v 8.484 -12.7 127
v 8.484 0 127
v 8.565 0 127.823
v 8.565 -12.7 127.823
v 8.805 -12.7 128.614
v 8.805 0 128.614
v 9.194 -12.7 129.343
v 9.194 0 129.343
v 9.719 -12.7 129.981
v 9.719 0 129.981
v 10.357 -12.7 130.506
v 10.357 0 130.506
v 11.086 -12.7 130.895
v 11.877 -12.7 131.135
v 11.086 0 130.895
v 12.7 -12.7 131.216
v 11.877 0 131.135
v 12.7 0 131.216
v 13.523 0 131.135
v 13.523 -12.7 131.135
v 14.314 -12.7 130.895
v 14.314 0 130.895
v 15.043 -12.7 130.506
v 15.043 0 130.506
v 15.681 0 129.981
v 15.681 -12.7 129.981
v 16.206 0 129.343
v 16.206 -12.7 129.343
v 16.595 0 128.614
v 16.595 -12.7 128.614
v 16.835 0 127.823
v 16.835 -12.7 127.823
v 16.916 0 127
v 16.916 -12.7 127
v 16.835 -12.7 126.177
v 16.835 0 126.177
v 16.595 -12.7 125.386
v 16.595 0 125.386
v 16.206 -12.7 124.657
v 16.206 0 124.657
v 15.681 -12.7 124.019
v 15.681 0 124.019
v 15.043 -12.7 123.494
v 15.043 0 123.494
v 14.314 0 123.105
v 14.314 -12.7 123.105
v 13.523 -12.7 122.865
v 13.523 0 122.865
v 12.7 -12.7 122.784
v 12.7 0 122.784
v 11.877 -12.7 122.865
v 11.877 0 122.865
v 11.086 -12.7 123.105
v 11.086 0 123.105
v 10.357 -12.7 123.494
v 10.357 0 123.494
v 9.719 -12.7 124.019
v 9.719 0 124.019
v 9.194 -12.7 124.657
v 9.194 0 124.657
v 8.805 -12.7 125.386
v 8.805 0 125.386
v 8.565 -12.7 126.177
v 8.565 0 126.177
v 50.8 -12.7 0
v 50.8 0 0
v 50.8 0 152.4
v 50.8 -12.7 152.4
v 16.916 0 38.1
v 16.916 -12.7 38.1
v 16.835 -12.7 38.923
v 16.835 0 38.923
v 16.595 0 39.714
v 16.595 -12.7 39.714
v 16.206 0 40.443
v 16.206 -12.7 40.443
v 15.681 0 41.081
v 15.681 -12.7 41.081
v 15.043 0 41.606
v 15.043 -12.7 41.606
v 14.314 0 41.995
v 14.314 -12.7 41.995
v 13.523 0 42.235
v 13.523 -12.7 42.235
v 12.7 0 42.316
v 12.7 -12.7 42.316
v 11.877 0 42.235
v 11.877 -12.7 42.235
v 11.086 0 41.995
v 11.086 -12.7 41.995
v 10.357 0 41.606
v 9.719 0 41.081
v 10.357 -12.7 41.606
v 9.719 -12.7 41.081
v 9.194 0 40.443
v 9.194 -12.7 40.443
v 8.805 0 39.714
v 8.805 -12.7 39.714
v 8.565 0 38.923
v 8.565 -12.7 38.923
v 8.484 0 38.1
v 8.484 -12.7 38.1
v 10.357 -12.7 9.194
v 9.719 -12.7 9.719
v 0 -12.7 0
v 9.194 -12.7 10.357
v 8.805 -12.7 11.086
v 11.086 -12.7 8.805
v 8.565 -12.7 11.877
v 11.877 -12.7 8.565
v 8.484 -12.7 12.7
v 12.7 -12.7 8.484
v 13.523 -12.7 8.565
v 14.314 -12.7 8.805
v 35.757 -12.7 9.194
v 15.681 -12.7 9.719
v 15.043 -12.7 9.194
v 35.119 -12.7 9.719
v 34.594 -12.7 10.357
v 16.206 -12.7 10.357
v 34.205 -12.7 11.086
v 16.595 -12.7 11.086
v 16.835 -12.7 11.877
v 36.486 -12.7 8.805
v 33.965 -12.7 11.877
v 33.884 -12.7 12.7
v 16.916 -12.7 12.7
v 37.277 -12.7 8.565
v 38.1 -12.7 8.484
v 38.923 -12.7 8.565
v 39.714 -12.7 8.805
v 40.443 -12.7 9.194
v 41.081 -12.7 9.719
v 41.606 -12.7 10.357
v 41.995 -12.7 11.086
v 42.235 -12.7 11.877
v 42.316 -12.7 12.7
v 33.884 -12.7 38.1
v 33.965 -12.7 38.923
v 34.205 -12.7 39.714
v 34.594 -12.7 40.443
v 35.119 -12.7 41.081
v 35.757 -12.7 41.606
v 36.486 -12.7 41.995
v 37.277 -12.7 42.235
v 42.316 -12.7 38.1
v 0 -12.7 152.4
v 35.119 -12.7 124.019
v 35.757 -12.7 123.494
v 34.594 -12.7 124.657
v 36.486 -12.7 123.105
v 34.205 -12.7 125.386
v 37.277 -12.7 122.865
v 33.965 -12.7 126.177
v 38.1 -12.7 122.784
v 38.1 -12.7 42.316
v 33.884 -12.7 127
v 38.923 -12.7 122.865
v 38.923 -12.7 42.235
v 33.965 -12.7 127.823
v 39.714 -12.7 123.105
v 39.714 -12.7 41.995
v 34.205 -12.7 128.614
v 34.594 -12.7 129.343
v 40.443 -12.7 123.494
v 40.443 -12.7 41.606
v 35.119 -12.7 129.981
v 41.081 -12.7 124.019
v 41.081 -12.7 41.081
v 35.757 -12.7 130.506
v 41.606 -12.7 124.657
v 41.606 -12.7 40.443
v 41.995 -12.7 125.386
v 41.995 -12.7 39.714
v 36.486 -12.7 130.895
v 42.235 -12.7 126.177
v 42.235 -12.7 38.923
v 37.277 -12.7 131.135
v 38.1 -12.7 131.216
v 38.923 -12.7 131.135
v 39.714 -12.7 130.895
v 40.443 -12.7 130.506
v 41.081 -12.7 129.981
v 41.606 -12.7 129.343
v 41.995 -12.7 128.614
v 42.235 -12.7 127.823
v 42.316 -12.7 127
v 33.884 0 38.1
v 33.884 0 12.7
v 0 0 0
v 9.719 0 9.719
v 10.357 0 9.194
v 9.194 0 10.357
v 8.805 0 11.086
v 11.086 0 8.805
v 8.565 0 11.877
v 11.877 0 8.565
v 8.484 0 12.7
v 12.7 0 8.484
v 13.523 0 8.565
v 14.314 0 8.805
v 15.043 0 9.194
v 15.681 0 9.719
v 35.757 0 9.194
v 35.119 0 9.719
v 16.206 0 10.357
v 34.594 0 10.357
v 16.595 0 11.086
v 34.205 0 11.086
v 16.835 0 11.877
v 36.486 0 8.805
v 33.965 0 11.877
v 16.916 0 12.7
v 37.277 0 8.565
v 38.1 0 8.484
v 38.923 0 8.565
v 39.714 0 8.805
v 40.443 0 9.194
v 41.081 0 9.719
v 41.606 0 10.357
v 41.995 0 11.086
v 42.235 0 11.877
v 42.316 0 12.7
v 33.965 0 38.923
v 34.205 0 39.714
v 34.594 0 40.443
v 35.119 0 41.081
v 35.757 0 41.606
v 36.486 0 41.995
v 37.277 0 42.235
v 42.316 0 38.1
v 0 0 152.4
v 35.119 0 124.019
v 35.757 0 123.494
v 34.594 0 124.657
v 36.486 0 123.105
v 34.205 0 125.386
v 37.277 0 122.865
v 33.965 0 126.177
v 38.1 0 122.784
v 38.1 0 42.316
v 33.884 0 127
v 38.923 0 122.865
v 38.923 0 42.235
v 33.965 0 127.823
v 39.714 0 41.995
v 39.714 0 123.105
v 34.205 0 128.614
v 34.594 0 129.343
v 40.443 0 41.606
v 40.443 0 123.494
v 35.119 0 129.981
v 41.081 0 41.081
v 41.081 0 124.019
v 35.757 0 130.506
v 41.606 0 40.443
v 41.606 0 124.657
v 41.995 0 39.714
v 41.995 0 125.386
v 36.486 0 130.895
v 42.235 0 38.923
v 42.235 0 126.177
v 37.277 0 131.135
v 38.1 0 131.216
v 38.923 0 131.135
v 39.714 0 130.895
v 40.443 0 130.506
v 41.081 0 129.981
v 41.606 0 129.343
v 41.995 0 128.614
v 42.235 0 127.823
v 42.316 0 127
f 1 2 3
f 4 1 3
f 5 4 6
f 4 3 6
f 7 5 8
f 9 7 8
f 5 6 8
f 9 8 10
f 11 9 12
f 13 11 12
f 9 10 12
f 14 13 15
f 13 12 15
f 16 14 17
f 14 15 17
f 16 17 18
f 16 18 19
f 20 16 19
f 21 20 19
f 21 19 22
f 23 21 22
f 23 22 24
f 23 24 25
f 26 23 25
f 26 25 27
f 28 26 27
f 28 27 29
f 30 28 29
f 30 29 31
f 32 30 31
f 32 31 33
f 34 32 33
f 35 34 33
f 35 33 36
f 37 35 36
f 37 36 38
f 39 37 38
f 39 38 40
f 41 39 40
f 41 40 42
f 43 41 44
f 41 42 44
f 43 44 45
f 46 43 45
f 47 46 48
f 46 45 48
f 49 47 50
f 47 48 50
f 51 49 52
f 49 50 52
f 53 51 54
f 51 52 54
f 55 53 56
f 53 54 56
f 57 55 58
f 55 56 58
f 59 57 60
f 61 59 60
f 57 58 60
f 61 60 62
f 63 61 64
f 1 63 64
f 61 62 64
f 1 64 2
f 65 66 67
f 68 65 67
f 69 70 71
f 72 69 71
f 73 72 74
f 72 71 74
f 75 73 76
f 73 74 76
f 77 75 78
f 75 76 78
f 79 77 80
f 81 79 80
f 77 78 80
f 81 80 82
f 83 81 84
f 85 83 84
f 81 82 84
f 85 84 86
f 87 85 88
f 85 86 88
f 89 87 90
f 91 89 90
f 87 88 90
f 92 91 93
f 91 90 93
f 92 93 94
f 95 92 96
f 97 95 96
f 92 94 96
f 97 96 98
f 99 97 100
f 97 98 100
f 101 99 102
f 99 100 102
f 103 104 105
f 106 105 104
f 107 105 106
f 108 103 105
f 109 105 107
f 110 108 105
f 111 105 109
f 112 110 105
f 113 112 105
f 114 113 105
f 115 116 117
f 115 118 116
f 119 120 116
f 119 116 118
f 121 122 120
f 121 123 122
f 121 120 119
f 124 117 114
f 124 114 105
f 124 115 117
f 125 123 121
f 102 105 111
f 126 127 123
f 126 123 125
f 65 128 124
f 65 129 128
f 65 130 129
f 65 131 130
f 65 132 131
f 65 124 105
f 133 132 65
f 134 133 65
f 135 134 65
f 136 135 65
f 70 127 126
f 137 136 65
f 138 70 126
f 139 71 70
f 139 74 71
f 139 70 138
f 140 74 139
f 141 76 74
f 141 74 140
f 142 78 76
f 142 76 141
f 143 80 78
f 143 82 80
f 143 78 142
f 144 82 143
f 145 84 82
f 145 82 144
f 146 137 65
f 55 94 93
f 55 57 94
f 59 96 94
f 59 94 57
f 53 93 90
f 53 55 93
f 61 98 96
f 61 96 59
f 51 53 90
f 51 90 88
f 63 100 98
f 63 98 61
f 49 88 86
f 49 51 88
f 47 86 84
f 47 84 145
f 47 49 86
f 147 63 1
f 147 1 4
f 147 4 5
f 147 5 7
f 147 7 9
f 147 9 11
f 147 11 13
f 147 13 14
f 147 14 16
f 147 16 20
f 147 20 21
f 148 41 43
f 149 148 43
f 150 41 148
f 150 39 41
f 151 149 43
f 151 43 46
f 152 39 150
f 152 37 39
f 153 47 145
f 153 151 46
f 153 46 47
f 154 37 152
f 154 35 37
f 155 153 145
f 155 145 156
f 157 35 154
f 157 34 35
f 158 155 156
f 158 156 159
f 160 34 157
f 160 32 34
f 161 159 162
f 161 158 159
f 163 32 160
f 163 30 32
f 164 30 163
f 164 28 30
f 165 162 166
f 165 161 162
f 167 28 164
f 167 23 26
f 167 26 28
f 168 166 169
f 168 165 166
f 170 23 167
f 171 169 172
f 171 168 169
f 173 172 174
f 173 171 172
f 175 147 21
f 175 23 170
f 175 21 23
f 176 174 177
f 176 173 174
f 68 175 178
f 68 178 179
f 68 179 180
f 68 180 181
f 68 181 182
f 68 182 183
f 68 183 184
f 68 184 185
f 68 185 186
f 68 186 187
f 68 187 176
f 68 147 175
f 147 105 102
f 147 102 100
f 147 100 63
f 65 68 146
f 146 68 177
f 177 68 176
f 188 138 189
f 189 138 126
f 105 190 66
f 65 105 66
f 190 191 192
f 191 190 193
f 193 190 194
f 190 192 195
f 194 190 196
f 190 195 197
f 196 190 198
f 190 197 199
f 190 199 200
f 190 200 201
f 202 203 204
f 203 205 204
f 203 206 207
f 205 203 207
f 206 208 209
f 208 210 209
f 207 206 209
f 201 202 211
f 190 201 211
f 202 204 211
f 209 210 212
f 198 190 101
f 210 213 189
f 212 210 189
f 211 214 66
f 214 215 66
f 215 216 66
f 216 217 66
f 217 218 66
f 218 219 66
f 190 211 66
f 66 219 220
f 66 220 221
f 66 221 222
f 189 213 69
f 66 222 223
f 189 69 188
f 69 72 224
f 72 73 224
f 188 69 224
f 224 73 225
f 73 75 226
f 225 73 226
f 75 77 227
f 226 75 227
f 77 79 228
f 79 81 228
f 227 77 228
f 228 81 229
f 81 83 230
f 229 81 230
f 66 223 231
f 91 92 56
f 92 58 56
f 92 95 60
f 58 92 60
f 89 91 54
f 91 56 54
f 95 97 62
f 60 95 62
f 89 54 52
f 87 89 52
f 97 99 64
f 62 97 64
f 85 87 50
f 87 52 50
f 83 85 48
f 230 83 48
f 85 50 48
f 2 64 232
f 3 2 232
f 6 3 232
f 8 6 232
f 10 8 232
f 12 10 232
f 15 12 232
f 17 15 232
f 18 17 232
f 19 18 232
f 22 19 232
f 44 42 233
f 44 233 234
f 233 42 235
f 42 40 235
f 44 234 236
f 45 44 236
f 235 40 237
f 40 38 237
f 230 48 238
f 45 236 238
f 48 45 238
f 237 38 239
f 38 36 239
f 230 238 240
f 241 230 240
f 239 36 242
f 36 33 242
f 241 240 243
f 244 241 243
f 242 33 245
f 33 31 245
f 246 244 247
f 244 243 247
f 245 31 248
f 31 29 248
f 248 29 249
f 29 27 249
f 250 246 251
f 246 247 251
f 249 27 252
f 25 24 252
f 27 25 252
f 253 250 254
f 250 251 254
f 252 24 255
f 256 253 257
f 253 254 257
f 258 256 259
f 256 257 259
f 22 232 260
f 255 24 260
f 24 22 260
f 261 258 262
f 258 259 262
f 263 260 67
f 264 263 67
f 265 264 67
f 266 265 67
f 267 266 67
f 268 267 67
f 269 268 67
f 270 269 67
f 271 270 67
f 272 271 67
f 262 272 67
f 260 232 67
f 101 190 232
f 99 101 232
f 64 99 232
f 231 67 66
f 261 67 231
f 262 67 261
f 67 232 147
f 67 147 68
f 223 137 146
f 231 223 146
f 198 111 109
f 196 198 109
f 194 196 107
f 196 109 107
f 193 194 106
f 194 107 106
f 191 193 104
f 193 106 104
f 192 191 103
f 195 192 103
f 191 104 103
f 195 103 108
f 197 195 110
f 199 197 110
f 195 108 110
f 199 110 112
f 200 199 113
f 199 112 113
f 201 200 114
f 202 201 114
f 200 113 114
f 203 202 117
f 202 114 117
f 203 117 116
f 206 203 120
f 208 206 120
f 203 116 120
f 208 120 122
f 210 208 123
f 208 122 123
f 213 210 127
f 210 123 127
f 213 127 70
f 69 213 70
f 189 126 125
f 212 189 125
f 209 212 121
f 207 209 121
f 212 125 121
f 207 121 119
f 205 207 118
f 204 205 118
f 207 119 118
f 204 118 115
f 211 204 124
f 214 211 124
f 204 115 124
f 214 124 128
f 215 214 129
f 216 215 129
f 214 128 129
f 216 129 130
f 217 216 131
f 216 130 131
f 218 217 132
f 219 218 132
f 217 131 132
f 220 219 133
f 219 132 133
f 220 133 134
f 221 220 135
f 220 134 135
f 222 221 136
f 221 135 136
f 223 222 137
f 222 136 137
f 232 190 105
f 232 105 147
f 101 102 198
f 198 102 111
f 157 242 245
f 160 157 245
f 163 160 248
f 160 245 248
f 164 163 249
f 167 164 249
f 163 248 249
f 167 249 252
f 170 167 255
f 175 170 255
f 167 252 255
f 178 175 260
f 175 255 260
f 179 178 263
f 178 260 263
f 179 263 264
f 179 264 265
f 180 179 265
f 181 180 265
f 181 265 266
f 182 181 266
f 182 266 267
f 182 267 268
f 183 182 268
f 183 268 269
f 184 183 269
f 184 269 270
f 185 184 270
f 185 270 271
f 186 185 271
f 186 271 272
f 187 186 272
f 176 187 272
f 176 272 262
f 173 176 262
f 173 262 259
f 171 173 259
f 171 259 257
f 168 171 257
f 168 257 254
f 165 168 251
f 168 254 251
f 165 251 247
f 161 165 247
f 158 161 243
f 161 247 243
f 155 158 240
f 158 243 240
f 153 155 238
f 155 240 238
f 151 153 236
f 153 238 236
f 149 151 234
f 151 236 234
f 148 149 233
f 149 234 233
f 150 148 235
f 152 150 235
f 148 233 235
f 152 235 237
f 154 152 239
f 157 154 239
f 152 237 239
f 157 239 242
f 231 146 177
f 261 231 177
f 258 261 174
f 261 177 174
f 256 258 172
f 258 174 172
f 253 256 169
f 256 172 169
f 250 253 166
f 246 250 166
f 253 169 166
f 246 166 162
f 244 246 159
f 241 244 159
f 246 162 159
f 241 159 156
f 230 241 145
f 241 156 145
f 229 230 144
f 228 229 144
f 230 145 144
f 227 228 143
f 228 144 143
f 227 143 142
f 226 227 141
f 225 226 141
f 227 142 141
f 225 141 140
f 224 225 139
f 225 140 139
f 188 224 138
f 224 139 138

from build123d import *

# Parameters (mm, degrees)
F0_W     = 50.8
F0_H     = 152.4
F1_DEPTH = 12.7
F4_D     = 8.4328
F6_DEPTH = 12.701


with BuildPart() as f1:
    # F0 (on Front) → F1 (new body)
    with BuildSketch(Plane.XZ):
        with Locations((25.4, 76.2)):
            Rectangle(F0_W, F0_H)
    extrude(amount=F1_DEPTH)

    # F4 (through all)
    with Locations(Plane.XZ.offset(12.7)):
        with Locations((12.7, 127), (38.1, 127)):
            Hole(F4_D / 2)

    # F5 (on face) → F6 (cut, through all)
    with BuildSketch(Plane.XZ.offset(12.7)):
        with BuildLine():
            Line((16.9164, 12.7), (16.9164, 38.1))
            ThreePointArc((16.9164, 38.1), (12.7, 42.3164), (8.4836, 38.1))
            Line((8.4836, 38.1), (8.4836, 12.7))
            ThreePointArc((8.4836, 12.7), (12.7, 8.4836), (16.9164, 12.7))
        make_face()
        with BuildLine():
            Line((42.3164, 12.7), (42.3164, 38.1))
            ThreePointArc((42.3164, 38.1), (38.1, 42.3164), (33.8836, 38.1))
            Line((33.8836, 38.1), (33.8836, 12.7))
            ThreePointArc((33.8836, 12.7), (38.1, 8.4836), (42.3164, 12.7))
        make_face()
    extrude(amount=-F6_DEPTH, mode=Mode.SUBTRACT)


solid = f1.part
